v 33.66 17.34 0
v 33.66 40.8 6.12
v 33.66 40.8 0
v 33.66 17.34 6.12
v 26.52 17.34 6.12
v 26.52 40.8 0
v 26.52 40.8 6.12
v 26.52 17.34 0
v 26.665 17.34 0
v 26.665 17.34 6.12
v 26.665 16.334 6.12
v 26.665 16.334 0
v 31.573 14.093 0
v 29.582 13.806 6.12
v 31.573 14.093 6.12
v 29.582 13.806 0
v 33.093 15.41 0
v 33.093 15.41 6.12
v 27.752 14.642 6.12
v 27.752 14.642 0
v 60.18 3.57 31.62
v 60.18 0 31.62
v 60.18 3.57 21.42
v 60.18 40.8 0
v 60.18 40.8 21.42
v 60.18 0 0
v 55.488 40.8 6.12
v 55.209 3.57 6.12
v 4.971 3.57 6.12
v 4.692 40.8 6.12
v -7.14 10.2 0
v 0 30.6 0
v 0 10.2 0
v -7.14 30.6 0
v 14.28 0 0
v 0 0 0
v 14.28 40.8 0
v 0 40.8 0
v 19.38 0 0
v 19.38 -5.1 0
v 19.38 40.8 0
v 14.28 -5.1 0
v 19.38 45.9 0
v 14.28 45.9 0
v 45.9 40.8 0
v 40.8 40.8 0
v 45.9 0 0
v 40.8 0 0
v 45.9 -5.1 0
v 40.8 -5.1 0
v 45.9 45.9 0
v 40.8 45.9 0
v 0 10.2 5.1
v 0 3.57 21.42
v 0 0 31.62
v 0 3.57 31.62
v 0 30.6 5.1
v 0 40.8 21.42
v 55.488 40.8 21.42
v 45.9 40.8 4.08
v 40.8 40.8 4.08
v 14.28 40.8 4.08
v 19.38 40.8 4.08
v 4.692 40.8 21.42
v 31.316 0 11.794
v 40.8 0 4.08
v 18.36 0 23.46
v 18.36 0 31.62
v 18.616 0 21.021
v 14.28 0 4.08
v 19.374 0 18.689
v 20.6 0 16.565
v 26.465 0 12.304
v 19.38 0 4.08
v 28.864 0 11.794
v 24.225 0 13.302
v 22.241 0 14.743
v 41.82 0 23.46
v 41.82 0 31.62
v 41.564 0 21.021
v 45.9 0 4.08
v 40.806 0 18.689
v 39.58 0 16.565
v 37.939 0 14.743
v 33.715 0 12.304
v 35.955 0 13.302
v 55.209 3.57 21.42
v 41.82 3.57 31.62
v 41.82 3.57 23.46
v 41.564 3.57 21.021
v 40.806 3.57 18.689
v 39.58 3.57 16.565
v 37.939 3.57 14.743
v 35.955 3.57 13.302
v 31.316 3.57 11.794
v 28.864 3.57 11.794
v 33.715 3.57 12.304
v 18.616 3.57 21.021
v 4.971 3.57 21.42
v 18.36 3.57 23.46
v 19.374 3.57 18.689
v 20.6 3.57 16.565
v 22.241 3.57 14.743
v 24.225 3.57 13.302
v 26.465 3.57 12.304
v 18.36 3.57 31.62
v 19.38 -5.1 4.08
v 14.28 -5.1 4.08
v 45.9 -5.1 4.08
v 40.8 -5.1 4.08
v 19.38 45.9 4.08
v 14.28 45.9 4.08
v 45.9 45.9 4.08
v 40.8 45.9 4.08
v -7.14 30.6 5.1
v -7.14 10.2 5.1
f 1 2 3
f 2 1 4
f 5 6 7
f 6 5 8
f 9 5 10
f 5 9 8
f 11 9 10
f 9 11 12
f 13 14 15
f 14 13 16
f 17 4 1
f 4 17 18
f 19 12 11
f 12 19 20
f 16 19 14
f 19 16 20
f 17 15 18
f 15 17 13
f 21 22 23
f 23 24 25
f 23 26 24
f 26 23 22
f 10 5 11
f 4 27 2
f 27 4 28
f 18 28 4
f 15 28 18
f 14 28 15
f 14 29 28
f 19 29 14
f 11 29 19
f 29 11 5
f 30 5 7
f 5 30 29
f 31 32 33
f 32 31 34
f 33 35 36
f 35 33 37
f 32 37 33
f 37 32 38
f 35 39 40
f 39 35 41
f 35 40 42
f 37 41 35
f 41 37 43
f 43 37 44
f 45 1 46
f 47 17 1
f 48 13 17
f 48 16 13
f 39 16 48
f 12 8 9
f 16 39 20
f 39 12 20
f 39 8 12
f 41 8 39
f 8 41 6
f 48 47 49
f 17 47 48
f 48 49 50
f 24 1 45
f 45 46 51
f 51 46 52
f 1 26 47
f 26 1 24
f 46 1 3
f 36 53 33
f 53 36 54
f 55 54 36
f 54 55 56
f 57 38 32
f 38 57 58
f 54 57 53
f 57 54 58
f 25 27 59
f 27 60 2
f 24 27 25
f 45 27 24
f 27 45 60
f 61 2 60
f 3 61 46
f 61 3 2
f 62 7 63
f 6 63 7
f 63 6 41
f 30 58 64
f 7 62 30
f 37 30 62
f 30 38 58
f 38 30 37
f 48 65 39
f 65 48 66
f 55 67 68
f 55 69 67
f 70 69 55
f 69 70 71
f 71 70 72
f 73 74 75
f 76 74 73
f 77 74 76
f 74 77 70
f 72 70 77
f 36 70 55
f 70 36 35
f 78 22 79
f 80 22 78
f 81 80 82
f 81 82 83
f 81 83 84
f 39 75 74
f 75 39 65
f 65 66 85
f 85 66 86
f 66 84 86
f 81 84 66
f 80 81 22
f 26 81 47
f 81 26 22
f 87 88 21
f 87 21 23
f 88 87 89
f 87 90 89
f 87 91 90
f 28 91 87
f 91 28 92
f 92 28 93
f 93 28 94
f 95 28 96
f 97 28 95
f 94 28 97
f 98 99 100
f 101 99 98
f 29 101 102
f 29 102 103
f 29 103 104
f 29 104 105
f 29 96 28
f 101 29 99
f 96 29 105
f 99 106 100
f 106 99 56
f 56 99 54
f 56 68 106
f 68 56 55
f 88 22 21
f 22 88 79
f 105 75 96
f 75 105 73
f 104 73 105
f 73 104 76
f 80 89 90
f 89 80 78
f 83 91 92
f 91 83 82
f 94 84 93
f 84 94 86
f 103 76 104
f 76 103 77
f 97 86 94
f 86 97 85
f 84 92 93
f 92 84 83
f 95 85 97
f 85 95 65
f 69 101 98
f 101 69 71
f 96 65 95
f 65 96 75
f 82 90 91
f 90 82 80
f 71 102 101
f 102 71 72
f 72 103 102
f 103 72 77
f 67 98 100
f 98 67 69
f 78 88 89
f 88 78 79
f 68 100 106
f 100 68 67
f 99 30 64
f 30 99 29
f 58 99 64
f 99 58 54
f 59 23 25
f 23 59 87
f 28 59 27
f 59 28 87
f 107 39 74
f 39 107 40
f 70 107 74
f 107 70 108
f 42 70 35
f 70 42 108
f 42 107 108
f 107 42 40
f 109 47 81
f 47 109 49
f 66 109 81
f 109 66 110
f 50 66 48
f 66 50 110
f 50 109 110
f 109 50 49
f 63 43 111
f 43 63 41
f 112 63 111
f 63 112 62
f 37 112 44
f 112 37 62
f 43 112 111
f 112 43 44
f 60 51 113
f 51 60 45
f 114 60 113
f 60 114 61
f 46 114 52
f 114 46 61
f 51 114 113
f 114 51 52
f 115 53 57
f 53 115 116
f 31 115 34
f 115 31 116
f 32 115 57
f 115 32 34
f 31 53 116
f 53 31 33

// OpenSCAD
scale([1.02,1.02,1.02]){
//baseplate
difference(){
	cube([59,40,6]);
	color("green")translate([26,17,-1]){
		cube([7,26,8]);
		translate([3.5,0,0])cylinder(8,3.5,3.5);
	}
}
//front wall
difference(){
	union(){
		color("green")translate([0,0,6])cube([59,3.5,5]);
		translate([0,0,11])cube([59,3.5,20]);
	}
	color("red") translate([29.5,4,23]) rotate([90,0,0])cylinder(5,11.5,11.5);
	color("blue") translate([18,-1,23])cube([23,5,20]);
}
//left wall
color("red")translate([0,0,6]){
	linear_extrude(height=15, center=false, convexity=14, twist=0)
	polygon( [ [0,0],[0,40],[4.6,40],[4.9,0] ] );
}
//right wall
color("red")translate([59,0,6]){
	linear_extrude(height=15, center=false, convexity=14, twist=0)
	polygon( [ [0,0],[0,40],[-4.6,40],[-4.9,0] ] );
}

//elastics mounting points
translate([14,-5,])cube([5,5,4]);
translate([40,-5,])cube([5,5,4]);
translate([14,40,])cube([5,5,4]);
translate([40,40,])cube([5,5,4]);


//arm mounting point
translate([-7,10,0])cube([7,20,5]);
}
